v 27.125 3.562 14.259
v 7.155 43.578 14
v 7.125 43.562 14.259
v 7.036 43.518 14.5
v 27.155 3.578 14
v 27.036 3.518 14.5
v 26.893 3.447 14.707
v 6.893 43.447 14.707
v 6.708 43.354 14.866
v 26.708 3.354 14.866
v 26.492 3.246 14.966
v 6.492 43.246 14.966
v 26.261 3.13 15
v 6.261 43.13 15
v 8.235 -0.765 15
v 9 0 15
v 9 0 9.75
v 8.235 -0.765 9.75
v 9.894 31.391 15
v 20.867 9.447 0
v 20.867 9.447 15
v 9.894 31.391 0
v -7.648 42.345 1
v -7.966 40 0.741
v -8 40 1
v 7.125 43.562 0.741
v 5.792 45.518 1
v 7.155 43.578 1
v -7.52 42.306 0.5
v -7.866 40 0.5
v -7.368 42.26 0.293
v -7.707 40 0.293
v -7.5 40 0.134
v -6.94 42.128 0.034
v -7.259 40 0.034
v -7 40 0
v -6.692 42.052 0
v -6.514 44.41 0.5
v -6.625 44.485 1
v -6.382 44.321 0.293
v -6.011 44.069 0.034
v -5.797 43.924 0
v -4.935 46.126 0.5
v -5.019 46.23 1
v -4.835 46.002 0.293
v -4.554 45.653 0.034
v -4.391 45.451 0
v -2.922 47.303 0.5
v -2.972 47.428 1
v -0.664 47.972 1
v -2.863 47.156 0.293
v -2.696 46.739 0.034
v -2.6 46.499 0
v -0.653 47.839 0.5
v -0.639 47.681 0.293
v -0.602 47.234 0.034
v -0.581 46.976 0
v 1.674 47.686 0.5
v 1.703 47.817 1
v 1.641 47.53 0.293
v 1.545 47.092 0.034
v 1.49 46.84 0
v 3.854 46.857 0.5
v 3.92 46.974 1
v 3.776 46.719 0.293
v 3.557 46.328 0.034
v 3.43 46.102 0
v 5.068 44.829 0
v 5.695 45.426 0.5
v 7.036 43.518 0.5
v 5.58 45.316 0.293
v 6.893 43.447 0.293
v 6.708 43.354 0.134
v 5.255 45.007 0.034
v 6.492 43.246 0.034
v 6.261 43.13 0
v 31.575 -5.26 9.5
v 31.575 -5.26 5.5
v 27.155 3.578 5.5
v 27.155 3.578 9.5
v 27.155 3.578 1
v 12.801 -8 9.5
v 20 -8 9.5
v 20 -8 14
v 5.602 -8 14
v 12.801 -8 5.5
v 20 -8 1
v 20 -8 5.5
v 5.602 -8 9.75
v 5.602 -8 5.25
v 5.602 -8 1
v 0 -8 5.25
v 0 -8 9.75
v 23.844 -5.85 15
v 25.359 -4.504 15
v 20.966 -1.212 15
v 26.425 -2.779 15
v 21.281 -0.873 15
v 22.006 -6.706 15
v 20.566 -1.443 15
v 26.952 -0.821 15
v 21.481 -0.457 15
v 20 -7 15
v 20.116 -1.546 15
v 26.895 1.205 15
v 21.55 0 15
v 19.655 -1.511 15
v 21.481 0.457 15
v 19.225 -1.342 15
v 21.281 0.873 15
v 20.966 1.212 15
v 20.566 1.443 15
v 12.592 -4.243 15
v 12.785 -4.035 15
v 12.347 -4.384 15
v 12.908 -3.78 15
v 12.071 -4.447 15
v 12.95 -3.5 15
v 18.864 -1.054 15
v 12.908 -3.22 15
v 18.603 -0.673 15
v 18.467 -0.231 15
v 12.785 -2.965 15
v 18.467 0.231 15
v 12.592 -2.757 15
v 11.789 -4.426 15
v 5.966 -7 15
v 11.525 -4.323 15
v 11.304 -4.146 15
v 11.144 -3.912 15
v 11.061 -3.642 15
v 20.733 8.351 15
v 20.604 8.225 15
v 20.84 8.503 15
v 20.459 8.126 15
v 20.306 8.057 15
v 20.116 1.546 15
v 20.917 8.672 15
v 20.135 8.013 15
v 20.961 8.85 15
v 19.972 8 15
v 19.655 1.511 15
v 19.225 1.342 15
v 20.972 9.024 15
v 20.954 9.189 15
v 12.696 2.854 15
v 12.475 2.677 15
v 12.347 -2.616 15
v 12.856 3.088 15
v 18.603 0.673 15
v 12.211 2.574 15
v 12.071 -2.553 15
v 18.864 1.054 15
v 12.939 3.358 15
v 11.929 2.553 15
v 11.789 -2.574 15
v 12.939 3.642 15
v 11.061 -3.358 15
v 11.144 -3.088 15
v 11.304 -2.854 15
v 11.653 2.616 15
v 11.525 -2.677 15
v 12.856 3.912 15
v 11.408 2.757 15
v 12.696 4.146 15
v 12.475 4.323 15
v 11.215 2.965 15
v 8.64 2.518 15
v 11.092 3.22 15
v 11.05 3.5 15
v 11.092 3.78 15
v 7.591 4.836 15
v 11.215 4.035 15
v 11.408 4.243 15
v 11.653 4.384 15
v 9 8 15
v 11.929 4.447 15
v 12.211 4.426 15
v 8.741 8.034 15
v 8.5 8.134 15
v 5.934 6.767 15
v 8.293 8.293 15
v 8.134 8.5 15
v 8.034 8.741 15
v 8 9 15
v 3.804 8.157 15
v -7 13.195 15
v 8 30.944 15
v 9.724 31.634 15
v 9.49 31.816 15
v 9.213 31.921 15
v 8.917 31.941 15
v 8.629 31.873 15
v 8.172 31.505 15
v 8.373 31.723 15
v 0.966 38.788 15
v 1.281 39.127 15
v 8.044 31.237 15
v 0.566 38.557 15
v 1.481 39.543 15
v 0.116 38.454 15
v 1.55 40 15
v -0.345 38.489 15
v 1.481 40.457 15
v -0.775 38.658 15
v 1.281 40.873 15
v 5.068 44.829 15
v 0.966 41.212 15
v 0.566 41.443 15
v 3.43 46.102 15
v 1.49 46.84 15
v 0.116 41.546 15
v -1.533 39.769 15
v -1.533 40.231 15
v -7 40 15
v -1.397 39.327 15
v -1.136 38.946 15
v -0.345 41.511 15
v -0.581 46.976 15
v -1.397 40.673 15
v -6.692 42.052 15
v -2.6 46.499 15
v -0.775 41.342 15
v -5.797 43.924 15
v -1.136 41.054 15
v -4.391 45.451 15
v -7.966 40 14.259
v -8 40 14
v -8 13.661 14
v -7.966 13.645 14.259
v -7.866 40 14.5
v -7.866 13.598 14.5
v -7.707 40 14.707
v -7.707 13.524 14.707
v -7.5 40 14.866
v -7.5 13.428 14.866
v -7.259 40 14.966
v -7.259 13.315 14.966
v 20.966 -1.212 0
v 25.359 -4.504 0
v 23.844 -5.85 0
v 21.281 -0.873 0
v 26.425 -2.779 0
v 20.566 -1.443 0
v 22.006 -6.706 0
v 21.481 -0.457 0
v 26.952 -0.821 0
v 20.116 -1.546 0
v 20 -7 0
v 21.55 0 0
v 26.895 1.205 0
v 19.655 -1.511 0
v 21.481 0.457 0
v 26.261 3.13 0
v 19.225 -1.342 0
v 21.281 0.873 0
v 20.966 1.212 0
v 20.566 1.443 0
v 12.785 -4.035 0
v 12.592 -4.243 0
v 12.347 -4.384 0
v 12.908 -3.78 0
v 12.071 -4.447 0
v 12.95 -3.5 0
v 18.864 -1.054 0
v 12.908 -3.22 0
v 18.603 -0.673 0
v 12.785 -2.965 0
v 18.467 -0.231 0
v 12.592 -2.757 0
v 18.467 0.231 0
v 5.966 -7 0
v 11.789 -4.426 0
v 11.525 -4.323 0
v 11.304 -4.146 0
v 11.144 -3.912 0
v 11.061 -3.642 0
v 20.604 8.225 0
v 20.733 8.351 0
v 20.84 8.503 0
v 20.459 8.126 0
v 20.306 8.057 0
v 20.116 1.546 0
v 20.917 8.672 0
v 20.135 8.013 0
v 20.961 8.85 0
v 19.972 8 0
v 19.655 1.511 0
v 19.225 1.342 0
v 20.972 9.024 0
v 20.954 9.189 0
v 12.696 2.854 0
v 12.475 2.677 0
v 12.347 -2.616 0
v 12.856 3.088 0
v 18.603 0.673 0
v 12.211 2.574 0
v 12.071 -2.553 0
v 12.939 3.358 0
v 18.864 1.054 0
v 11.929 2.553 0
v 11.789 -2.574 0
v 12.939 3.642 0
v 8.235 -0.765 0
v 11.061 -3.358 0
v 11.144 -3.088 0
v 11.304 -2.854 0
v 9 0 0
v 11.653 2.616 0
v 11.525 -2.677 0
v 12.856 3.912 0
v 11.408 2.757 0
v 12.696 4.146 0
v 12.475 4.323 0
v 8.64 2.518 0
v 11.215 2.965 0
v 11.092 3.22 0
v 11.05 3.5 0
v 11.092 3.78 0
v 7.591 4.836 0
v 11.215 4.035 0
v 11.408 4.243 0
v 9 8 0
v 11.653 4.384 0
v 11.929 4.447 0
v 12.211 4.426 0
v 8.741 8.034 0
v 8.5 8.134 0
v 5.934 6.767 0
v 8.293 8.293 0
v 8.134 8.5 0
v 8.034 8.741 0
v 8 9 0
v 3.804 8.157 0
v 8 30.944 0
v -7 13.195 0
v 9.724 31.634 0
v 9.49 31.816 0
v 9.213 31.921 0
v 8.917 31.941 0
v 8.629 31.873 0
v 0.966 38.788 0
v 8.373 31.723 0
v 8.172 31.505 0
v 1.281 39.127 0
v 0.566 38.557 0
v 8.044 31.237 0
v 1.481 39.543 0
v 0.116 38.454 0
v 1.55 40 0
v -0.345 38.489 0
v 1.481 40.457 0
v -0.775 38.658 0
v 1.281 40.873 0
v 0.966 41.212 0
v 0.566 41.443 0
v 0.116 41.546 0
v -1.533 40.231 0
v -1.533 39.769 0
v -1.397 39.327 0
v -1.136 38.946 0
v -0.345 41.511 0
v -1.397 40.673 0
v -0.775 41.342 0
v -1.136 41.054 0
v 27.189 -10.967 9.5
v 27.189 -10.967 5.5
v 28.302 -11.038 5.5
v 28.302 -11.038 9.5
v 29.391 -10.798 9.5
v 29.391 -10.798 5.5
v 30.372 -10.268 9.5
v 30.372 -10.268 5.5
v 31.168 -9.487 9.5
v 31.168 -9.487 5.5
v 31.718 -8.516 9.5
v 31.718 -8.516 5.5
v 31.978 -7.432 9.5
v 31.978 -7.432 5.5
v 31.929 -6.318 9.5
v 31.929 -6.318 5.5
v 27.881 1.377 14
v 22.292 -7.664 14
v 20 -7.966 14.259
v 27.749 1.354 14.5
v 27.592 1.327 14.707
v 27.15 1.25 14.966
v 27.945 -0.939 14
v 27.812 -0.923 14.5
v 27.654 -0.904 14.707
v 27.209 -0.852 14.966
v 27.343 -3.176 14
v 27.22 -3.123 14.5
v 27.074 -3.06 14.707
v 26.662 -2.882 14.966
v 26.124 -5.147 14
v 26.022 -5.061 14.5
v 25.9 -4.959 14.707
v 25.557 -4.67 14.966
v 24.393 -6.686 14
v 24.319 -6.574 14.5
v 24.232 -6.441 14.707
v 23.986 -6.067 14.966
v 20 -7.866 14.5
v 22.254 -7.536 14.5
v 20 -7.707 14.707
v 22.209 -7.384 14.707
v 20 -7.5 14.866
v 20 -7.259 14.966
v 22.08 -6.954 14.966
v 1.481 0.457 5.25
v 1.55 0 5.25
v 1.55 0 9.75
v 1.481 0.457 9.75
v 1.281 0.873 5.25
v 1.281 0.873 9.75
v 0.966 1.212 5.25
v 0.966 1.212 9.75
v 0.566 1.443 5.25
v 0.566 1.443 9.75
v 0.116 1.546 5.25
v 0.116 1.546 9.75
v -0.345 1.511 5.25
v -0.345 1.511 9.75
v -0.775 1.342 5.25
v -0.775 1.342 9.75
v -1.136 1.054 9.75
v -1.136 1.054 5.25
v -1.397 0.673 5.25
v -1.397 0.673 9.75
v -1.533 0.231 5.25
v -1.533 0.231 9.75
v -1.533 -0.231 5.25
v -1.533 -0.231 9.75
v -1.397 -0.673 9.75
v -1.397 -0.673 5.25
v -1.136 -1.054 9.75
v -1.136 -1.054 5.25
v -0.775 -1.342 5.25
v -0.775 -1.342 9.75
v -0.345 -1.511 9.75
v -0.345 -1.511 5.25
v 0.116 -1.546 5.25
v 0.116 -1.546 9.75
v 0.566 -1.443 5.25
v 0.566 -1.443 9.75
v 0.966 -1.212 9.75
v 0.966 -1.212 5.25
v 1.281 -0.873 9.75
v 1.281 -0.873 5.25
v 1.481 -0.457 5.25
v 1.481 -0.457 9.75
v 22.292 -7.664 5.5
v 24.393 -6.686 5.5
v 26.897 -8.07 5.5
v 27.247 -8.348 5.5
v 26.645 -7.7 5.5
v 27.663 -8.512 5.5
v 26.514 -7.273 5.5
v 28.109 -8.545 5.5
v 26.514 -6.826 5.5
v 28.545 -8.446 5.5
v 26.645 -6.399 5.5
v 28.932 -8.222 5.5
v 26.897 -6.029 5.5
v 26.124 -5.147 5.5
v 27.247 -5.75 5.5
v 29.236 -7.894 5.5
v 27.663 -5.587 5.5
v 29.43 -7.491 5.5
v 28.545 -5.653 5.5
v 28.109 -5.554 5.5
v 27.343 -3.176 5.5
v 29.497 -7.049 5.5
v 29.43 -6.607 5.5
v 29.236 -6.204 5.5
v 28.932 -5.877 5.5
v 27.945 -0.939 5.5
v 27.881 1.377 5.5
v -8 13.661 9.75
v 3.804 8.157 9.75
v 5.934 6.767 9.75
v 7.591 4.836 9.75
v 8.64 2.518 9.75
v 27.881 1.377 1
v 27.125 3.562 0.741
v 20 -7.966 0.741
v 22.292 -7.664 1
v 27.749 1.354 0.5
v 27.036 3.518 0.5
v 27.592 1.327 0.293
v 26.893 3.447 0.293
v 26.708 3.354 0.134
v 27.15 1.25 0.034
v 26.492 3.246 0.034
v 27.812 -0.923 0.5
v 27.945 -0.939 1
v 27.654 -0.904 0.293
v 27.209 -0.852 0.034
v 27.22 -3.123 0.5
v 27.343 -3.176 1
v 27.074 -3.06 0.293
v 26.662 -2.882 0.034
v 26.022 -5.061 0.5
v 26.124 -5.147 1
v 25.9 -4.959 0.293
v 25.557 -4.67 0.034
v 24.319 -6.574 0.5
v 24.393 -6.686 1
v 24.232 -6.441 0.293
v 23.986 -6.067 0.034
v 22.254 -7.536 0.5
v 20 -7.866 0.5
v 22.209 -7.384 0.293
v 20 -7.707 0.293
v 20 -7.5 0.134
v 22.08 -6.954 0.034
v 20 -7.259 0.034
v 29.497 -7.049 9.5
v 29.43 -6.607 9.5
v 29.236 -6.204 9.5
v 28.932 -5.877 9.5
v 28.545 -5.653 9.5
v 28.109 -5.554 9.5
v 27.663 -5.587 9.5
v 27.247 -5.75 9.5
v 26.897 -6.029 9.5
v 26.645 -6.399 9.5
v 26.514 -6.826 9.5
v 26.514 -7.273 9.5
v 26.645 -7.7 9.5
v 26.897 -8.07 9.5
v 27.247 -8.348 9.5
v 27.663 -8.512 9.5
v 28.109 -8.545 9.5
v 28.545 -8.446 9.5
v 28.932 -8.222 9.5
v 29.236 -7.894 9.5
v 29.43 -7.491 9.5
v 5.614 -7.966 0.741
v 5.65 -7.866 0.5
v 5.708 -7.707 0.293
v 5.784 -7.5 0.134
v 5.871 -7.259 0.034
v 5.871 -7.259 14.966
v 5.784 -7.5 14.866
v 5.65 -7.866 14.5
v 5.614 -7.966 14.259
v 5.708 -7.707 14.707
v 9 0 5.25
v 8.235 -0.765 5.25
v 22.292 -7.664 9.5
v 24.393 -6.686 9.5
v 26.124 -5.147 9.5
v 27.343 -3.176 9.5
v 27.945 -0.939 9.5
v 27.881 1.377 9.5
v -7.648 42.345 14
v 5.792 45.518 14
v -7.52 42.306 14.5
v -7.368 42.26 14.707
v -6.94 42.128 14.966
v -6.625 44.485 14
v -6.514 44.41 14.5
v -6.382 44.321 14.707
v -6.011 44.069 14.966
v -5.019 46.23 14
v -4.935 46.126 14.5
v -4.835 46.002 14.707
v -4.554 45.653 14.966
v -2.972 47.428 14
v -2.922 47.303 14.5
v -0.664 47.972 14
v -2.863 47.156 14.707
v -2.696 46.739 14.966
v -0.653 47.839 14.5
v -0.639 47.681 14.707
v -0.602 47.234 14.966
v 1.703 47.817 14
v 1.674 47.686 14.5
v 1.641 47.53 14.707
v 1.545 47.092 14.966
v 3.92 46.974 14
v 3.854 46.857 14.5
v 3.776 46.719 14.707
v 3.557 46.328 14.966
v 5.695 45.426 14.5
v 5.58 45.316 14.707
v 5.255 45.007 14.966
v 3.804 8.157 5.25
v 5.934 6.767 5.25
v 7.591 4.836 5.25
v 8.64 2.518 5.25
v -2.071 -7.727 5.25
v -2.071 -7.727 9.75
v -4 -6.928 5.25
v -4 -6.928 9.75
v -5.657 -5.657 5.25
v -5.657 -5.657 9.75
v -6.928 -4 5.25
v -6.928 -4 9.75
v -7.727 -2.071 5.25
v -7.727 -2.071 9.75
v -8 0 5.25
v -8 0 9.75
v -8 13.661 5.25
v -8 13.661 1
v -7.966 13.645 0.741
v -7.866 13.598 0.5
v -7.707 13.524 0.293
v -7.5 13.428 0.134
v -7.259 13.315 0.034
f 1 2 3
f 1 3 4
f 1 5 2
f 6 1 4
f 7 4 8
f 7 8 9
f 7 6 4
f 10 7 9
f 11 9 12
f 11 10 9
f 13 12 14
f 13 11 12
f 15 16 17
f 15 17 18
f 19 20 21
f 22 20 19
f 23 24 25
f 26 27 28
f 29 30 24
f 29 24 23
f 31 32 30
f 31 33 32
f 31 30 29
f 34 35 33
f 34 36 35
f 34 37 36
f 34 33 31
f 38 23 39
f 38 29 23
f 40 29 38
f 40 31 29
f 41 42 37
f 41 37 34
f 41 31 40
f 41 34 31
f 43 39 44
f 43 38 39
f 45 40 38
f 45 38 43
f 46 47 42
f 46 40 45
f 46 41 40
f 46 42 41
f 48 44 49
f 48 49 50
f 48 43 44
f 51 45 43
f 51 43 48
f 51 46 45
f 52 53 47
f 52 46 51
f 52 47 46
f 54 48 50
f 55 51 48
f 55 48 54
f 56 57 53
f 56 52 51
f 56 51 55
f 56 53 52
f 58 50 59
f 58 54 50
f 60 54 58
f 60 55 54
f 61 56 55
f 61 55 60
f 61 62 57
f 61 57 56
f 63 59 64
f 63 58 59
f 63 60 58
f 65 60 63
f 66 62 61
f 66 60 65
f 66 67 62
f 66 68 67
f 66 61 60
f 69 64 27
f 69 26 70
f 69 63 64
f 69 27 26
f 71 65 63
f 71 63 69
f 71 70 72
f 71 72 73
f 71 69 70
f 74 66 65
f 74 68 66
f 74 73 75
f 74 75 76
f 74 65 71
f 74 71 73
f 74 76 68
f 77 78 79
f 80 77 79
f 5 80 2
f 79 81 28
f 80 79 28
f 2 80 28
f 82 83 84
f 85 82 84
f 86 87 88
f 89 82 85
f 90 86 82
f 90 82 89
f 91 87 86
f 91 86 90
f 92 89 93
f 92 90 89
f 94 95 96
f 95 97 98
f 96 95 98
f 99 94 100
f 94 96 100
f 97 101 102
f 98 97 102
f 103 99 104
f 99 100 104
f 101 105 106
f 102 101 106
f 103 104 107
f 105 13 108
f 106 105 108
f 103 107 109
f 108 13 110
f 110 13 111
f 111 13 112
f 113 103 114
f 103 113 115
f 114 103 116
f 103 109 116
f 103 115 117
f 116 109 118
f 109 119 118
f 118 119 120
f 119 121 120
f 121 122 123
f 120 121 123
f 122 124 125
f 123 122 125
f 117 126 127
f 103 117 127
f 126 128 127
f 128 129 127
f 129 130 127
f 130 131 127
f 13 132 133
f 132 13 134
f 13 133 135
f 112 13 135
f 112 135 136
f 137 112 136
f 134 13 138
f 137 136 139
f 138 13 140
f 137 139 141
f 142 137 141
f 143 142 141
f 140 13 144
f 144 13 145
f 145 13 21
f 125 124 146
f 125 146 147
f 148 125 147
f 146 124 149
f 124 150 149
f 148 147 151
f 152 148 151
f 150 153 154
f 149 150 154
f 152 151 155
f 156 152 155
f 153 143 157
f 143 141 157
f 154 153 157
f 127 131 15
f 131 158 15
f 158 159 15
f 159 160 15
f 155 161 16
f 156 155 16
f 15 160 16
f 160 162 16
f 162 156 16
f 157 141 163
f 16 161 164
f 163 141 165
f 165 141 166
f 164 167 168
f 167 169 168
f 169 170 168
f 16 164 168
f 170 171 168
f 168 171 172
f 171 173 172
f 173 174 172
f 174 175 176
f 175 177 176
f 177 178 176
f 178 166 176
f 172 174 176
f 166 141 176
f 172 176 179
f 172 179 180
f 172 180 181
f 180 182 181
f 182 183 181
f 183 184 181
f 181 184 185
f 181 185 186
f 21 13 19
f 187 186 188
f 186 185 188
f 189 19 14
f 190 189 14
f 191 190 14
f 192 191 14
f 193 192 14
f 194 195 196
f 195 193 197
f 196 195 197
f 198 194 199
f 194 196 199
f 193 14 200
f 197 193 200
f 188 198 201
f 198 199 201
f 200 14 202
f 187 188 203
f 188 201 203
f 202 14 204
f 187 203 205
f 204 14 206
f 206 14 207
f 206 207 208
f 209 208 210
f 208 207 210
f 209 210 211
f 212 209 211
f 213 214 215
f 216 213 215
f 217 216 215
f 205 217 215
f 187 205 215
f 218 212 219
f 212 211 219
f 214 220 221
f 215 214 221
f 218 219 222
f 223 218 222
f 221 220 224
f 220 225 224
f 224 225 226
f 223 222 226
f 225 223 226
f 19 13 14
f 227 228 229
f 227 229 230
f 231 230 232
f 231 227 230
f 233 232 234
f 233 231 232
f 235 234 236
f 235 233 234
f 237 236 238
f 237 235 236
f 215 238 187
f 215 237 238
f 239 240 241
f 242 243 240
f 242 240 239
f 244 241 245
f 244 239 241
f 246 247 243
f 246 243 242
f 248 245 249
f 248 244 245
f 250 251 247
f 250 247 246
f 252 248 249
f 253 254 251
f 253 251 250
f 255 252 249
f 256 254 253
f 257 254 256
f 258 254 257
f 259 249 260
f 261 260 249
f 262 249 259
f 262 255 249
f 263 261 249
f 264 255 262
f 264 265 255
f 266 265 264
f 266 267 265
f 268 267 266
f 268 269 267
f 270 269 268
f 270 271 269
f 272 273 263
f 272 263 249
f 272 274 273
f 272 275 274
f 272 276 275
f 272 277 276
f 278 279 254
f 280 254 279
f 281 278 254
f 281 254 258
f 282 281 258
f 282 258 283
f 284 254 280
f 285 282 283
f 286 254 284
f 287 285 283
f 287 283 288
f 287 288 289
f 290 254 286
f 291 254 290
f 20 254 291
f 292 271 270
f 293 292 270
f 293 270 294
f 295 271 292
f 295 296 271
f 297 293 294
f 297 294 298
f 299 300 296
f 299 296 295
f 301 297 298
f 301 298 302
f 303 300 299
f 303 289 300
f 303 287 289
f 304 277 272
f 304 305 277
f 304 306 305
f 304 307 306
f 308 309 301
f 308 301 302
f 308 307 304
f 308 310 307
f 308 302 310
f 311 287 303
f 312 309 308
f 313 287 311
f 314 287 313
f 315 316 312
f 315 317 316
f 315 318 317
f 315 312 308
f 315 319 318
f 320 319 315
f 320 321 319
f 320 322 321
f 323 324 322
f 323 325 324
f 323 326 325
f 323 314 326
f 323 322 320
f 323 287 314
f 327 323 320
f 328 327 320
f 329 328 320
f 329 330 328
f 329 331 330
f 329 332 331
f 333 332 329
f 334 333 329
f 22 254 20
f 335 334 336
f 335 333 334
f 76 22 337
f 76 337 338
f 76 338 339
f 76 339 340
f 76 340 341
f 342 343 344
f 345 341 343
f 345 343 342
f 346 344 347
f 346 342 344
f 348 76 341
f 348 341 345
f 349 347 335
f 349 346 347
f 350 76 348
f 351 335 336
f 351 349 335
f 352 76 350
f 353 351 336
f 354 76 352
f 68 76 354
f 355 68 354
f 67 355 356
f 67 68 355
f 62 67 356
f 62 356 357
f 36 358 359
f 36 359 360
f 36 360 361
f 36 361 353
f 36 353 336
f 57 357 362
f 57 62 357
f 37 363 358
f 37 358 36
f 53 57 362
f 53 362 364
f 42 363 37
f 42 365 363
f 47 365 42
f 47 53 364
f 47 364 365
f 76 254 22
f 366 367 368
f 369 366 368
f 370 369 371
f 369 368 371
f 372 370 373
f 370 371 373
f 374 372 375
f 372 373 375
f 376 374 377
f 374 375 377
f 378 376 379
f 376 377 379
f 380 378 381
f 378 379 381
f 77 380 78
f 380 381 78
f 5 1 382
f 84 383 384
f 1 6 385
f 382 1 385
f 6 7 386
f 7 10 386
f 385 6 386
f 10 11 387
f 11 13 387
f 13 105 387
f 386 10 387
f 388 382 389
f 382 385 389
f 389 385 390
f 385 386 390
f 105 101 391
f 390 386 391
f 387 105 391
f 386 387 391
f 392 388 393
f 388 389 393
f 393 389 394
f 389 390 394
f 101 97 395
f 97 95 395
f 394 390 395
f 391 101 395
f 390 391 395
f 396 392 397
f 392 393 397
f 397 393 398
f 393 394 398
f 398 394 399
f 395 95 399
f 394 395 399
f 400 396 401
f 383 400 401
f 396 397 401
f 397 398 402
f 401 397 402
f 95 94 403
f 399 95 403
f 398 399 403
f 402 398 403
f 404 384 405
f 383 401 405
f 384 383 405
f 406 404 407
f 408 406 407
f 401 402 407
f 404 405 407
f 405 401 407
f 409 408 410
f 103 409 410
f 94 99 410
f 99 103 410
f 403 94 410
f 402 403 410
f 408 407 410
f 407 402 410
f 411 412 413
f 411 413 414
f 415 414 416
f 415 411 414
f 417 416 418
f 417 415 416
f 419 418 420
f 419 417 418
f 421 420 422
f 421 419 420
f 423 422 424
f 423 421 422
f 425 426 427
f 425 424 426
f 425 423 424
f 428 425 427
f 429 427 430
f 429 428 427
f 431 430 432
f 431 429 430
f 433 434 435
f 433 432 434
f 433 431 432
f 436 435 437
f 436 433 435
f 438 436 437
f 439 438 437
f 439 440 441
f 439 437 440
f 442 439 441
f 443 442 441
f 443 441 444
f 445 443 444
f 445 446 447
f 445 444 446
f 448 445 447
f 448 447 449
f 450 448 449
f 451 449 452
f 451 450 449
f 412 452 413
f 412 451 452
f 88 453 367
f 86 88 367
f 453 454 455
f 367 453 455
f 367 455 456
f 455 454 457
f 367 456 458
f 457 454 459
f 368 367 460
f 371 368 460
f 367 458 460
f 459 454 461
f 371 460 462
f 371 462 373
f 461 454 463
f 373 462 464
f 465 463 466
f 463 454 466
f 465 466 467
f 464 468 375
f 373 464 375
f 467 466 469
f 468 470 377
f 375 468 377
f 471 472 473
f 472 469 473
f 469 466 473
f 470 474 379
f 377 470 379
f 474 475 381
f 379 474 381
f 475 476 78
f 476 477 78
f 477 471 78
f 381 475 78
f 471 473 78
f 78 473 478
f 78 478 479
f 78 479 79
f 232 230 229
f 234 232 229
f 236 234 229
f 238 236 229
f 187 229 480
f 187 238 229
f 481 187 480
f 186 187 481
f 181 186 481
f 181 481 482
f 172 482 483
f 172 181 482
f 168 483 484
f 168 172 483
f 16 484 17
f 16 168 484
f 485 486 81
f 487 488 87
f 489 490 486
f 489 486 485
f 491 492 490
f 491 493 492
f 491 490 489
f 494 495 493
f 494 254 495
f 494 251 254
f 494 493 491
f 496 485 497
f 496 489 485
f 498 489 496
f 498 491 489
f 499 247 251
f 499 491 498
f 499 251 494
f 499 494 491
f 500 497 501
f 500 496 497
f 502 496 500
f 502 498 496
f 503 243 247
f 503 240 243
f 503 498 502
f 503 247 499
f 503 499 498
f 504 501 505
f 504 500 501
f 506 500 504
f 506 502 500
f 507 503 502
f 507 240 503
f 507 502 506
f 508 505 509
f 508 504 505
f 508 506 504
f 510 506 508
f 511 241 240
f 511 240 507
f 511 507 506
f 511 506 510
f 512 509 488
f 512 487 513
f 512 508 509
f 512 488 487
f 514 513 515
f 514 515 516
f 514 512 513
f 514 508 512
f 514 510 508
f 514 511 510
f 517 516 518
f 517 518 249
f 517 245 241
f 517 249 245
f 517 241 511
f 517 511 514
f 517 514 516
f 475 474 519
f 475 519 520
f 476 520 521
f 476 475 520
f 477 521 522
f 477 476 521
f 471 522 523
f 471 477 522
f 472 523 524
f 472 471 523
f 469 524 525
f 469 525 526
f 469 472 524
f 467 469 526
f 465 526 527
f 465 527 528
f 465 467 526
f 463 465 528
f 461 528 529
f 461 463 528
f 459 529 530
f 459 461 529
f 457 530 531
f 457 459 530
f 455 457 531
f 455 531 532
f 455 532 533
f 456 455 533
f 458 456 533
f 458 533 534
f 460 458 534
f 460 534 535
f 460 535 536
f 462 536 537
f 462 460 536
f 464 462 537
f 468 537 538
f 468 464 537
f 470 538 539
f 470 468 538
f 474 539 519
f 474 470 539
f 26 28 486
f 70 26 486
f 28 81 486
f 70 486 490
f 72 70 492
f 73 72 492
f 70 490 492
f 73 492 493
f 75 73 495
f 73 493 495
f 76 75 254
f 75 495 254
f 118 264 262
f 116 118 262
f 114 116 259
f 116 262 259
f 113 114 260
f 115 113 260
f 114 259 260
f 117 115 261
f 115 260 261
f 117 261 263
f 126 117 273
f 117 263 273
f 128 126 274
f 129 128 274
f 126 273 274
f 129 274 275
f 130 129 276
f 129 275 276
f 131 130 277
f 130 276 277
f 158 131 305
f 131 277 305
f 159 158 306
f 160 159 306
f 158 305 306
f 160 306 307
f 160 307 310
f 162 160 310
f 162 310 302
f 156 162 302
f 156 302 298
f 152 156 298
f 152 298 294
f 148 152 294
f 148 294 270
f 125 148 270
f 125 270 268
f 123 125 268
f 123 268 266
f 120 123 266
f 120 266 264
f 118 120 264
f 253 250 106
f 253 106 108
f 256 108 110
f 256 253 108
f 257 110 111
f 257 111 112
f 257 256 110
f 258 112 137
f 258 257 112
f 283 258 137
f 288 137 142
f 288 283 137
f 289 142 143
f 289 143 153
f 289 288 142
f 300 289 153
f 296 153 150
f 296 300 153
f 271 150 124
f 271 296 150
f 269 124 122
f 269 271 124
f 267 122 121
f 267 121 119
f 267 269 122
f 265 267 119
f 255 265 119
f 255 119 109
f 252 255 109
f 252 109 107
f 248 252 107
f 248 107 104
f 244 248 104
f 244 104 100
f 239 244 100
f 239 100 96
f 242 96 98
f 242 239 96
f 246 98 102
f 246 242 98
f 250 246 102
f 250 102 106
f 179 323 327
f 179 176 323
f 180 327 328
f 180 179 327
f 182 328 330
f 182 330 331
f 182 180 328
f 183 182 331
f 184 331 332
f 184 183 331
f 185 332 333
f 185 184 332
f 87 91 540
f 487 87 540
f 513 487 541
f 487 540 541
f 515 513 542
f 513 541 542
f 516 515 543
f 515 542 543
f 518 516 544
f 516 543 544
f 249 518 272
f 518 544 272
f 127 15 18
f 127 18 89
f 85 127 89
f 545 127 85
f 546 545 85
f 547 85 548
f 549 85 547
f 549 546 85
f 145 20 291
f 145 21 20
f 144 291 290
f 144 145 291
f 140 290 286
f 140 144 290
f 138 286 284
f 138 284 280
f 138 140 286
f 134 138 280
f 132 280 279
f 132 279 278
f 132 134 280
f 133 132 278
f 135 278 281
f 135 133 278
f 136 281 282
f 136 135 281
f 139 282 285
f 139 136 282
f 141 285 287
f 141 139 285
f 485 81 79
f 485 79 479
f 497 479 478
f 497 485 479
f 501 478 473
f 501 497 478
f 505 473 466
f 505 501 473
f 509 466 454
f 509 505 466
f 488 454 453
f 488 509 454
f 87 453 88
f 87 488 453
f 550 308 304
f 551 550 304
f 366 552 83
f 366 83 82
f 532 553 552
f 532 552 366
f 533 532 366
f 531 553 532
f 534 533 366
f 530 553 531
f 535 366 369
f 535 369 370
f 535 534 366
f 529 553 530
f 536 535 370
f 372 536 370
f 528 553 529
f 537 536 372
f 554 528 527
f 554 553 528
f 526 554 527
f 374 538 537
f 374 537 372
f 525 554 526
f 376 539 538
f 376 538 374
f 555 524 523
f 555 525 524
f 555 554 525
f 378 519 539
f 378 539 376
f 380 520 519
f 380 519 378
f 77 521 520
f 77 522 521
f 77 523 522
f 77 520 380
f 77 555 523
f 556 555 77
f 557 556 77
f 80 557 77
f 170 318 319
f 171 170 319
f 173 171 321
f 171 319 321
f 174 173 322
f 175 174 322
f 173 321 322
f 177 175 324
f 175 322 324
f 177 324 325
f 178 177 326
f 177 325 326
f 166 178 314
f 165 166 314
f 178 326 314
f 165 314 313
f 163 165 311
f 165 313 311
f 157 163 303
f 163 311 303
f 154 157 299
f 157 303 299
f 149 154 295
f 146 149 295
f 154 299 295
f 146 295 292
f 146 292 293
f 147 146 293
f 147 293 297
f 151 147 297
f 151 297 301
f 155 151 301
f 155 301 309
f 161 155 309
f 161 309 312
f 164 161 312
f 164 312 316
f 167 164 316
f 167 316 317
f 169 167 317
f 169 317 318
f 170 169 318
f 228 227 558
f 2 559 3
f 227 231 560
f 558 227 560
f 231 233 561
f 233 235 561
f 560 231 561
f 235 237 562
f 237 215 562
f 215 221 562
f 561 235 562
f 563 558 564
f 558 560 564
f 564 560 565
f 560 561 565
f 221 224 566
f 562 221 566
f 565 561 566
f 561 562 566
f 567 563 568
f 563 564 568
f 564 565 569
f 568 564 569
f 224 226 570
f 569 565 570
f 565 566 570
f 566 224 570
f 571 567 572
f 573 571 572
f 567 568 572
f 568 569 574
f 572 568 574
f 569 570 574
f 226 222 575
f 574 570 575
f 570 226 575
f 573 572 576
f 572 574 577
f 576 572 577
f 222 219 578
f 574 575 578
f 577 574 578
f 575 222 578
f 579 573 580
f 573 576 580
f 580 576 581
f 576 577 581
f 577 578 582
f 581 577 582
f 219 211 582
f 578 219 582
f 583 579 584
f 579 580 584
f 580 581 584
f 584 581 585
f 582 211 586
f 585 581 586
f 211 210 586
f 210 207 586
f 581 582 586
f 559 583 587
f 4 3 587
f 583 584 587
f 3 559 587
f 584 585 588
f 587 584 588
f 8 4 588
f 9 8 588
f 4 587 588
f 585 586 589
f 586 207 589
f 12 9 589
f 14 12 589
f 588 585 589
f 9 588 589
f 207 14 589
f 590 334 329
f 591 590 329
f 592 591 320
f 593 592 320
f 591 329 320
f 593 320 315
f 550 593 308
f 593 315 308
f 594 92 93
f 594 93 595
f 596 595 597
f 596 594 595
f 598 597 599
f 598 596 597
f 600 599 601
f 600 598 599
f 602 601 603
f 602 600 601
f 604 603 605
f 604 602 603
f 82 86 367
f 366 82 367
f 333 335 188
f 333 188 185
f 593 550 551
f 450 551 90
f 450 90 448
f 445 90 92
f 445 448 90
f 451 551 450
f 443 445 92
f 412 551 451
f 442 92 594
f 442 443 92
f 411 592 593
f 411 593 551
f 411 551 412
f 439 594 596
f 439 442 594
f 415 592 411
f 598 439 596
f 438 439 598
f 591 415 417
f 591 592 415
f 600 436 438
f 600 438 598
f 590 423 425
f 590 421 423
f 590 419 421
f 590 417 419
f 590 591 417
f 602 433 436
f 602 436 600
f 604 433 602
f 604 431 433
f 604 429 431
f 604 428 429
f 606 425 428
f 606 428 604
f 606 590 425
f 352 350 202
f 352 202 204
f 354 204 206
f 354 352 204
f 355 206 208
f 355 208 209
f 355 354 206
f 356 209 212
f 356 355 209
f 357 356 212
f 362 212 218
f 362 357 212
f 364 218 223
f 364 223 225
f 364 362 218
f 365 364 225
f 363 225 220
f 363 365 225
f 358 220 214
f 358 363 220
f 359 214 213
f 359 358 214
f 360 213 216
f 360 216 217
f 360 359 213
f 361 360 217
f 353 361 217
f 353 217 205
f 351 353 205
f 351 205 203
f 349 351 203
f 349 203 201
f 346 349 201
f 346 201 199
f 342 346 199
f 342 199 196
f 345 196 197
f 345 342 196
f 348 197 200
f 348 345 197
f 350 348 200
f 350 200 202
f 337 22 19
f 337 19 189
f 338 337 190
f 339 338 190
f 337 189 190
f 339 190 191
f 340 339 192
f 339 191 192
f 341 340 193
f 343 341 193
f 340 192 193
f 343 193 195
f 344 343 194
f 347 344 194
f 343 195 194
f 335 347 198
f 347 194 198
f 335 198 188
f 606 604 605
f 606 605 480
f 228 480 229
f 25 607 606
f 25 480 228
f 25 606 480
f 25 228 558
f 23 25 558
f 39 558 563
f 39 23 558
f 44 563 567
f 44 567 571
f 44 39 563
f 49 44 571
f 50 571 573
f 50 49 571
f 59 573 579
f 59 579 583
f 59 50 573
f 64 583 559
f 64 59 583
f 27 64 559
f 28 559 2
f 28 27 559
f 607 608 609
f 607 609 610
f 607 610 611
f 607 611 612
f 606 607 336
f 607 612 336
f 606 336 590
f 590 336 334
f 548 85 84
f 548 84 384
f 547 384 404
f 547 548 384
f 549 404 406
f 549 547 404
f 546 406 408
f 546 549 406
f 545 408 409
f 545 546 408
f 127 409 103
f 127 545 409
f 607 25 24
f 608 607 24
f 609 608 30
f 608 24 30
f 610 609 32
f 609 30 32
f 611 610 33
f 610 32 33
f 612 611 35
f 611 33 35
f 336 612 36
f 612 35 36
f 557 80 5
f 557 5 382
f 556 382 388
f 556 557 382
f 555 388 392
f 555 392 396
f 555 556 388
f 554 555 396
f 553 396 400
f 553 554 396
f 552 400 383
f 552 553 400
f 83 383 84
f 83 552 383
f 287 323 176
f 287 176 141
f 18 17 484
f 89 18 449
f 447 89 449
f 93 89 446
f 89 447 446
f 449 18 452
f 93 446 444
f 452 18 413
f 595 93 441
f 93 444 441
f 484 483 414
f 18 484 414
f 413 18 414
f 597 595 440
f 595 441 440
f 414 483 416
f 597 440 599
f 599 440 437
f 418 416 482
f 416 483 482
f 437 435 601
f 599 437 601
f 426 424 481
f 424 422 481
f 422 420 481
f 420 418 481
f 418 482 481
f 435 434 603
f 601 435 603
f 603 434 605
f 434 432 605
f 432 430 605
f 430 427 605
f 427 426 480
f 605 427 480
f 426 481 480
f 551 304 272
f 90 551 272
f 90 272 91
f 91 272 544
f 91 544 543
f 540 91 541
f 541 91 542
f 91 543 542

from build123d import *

# Parameters (mm, degrees)
SKETCH1_R                = 1.55
BOSS_EXTRUDE1_DEPTH      = 15
FILLET1_R                = 1
FILLET2_R                = 1
CUT_EXTRUDE1_DEPTH       = 5.25
BOSS_EXTRUDE2_DEPTH      = 2
BOSS_EXTRUDE2_DEPTH_BACK = 2
SKETCH3_R                = 1.5
SKETCH4_R                = 0.95
CUT_EXTRUDE2_DEPTH       = 60.605329072
CUT_EXTRUDE3_DEPTH       = 60.605329072
FILLET3_R                = 1


with BuildPart() as part:
    # Sketch1 → Boss-Extrude1 (new body)
    with BuildSketch(Plane.XY):
        with BuildLine():
            Line((20, -8), (0, -8))
            ThreePointArc((0, -8), (-5.656854249, -5.656854249), (-8, 0))
            Line((-8, 0), (-8, 40))
            ThreePointArc((-8, 40), (-1.838023364, 47.785991916), (7.155417528, 43.577708764))
            Line((7.155417528, 43.577708764), (27.155417528, 3.577708764))
            ThreePointArc((27.155417528, 3.577708764), (26.805206467, -4.205848897), (20, -8))
        make_face()
        Circle(SKETCH1_R, mode=Mode.SUBTRACT)
        with Locations((20, 0)):
            Circle(SKETCH1_R, mode=Mode.SUBTRACT)
        with Locations((0, 40)):
            Circle(SKETCH1_R, mode=Mode.SUBTRACT)
    extrude(amount=BOSS_EXTRUDE1_DEPTH)

    # Fillet1
    fillet1_edges = [part.edges().sort_by_distance(p)[0] for p in [
        (-8, 20, 0),
        (-1.838023364, 47.785991916, 0),
        (17.155417528, 23.577708764, 0),
        (26.805206467, -4.205848897, 0),
        (10, -8, 0),
        (-5.656854249, -5.656854249, 0),
    ]]
    fillet(fillet1_edges, radius=FILLET1_R)

    # Fillet2
    fillet2_edges = [part.edges().sort_by_distance(p)[0] for p in [
        (26.805206467, -4.205848897, 15),
        (17.155417528, 23.577708764, 15),
        (-1.838023364, 47.785991916, 15),
        (-8, 20, 15),
        (-5.656854249, -5.656854249, 15),
        (10, -8, 15),
    ]]
    fillet(fillet2_edges, radius=FILLET2_R)

    # Sketch2 → Cut-Extrude1 (cut)
    with BuildSketch(Plane.XY.offset(15)):
        with BuildLine():
            Line((5.601660306, -8), (-8, -8))
            Line((-8, -8), (-8, 13.660862536))
            Line((-8, 13.660862536), (3.803564356, 8.156770083))
            ThreePointArc((3.803564356, 8.156770083), (7.590523012, 4.835696475), (9, 0))
            Line((9, 0), (8.234976339, -0.765023661))
            Line((8.234976339, -0.765023661), (5.601660306, -8))
        make_face()
    cut_extrude1 = extrude(amount=-CUT_EXTRUDE1_DEPTH, mode=Mode.SUBTRACT)

    # Mirror1: Cut-Extrude1 across plane
    add(cut_extrude1.mirror(Plane.XY.offset(7.5)), mode=Mode.SUBTRACT)

    # Sketch3 → Boss-Extrude2 (add, two sides: drawn at the far end of the back side and taken through both)
    with BuildSketch(Plane.XY.offset(7.5).offset(-BOSS_EXTRUDE2_DEPTH_BACK)):
        with BuildLine():
            Line((31.574509444, -5.260475068), (27.155417528, 3.577708764))
            Line((27.155417528, 3.577708764), (12.800830153, -8))
            Line((12.800830153, -8), (27.18897642, -10.966907779))
            ThreePointArc((27.18897642, -10.966907779), (31.168378933, -9.486764863), (31.574509444, -5.260475068))
        make_face()
        with Locations((27.99680068, -7.04932945)):
            Circle(SKETCH3_R, mode=Mode.SUBTRACT)
    extrude(amount=BOSS_EXTRUDE2_DEPTH + BOSS_EXTRUDE2_DEPTH_BACK)

    # Sketch4 → Cut-Extrude2 (cut, through all)
    with BuildSketch(Plane(origin=(0, 0, 0), x_dir=(-1, 0, 0), z_dir=(0, 0, -1))):
        with Locations((-12, 3.5)):
            Circle(SKETCH4_R)
        with Locations(Location((-12, -3.5, 0), (0, 0, 180))):
            Circle(SKETCH4_R)
    extrude(amount=-CUT_EXTRUDE2_DEPTH, mode=Mode.SUBTRACT)

    # Sketch5 → Cut-Extrude3 (cut, through all)
    with BuildSketch(Plane(origin=(0, 0, 0), x_dir=(-1, 0, 0), z_dir=(0, 0, -1))):
        with BuildLine():
            Line((-8, 35.180339887), (-8, 8))
            Line((-8, 8), (-20, 8))
            ThreePointArc((-20, 8), (-20.844360125, 7.955316209), (-21.679287946, 7.821763995))
            Line((-21.679287946, 7.821763995), (-8, 35.180339887))
        make_face()
    extrude(amount=-CUT_EXTRUDE3_DEPTH, mode=Mode.SUBTRACT)

    # Fillet3
    fillet3_edges = [part.edges().sort_by_distance(p)[0] for p in [
        (8, 35.180339887, 7.5),
        (8, 8, 7.5),
        (21.679287946, 7.821763995, 7.5),
    ]]
    fillet(fillet3_edges, radius=FILLET3_R)


solid = part.part
